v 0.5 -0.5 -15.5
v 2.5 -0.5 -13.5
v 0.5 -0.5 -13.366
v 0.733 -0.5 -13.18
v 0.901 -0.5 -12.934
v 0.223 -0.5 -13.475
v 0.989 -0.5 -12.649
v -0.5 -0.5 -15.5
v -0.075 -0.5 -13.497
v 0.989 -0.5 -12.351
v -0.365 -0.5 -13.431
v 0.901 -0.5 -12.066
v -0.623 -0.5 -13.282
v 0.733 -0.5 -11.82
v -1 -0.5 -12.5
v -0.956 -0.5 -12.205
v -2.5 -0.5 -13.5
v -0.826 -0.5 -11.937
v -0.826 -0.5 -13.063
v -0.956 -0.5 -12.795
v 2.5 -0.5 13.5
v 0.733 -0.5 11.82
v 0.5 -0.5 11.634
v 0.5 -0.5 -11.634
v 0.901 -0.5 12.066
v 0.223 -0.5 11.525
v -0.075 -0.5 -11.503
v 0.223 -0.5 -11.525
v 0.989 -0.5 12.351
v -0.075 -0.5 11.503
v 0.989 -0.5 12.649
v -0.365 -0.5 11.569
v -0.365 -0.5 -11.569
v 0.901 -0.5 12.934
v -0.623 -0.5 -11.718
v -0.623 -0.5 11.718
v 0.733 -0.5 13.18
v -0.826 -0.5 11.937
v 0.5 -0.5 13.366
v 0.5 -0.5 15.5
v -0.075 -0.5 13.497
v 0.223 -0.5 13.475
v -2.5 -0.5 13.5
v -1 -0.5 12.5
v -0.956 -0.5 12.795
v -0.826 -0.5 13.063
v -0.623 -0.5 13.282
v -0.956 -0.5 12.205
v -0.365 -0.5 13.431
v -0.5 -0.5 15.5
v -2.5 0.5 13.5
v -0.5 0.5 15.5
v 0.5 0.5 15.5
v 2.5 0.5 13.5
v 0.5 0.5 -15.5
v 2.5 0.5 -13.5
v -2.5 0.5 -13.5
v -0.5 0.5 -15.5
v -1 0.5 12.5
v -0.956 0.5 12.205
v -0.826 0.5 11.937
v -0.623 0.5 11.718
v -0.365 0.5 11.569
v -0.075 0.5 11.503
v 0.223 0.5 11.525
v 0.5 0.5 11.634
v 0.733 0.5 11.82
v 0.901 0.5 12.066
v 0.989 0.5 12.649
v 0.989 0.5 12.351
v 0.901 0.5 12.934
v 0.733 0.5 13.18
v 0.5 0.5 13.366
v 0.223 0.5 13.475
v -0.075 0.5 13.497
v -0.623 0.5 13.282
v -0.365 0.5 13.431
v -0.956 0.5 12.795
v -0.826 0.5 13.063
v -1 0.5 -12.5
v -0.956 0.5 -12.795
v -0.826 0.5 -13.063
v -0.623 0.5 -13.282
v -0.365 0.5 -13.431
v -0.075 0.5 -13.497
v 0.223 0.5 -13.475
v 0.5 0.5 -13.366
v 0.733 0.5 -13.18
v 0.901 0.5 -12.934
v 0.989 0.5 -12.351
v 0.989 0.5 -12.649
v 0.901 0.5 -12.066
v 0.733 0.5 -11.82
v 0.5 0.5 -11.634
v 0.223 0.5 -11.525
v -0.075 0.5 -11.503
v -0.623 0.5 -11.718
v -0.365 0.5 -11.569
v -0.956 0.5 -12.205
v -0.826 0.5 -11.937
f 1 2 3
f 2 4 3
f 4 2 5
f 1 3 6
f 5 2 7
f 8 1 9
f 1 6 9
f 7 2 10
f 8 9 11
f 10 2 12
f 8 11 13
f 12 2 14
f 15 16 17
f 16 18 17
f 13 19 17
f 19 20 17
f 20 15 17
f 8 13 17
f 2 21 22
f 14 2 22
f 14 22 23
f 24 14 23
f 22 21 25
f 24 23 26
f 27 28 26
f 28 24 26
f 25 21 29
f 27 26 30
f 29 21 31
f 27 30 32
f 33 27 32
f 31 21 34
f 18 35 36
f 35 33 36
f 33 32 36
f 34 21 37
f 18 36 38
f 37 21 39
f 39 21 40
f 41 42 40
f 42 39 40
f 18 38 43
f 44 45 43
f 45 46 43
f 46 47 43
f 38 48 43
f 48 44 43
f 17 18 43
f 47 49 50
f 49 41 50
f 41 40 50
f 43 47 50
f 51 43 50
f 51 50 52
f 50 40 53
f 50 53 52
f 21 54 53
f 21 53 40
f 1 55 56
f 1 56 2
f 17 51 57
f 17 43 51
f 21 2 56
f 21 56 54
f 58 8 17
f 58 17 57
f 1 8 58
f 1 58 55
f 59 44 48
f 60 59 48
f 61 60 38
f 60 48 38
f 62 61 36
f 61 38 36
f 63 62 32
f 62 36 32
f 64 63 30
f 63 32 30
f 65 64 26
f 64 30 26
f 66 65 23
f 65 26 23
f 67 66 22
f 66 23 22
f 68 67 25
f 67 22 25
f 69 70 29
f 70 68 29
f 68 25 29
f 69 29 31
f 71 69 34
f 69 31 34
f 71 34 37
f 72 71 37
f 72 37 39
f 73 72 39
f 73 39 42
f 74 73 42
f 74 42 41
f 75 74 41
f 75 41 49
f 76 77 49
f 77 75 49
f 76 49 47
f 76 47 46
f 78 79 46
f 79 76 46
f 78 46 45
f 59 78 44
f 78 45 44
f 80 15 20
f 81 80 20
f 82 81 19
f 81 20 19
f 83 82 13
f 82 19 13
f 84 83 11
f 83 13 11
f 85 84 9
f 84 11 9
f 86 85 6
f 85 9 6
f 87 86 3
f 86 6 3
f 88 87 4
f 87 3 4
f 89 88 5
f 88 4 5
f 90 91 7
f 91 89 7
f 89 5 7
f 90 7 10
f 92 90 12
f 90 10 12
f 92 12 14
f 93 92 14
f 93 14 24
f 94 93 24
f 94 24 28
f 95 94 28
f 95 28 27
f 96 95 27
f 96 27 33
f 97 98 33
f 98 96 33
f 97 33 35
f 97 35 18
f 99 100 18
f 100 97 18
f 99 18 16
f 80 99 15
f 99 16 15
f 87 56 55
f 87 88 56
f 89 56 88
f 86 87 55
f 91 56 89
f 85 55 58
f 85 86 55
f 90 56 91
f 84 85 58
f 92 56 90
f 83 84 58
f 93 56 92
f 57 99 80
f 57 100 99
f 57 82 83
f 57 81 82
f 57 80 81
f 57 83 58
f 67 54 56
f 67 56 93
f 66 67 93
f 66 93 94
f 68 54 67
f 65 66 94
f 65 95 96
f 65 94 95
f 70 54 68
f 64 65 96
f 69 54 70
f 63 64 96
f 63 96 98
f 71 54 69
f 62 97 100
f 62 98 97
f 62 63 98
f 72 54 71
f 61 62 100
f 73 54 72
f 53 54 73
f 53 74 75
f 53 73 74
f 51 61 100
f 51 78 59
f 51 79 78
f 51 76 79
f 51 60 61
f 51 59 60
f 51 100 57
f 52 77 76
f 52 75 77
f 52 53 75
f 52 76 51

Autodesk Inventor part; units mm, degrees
ref_plane "YZ Plane" through (0, 0, 0) normal (1, 0, 0) x (0, 1, 0)
ref_plane "XZ Plane" through (0, 0, 0) normal (0, 1, 0) x (-1, 0, 0)
ref_plane "XY Plane" through (0, 0, 0) normal (0, 0, 1) x (1, 0, 0)
sketch "Skizze1" plane through (0, 0, 0) normal (0, 1, 0) x (-1, 0, 0)
  line L0 (-2.5, 15.5) -> (2.5, 15.5)
  line L1 (2.5, 15.5) -> (2.5, -15.5)
  line L2 (2.5, -15.5) -> (-2.5, -15.5)
  line L3 (-2.5, -15.5) -> (-2.5, 15.5)
  line L4 (-2.5, 15.5) -> (2.5, -15.5) construction
  line L5 (2.5, 15.5) -> (-2.5, -15.5) construction
  circle A0 centre (0, 12.5) radius 1
  circle A1 centre (0, -12.5) radius 1
  line L6 (3.5, 0) -> (-3.5, 0) projected
  point P0 (0, 0)
  point P1 (0, 0)
  dimension "d1" = 5
  dimension "d2" = 3
  dimension "d3" = 2
  dimension "d9" = 25
extrude "Extrusion1" add sketch "Skizze1" along normal mid plane 1
chamfer "Fase1" distance 2 angle 45 4 edges at (-2.5, 0, 15.5) (2.5, 0, 15.5) (-2.5, 0, -15.5) (2.5, 0, -15.5)
properties part number "Schenkel"
